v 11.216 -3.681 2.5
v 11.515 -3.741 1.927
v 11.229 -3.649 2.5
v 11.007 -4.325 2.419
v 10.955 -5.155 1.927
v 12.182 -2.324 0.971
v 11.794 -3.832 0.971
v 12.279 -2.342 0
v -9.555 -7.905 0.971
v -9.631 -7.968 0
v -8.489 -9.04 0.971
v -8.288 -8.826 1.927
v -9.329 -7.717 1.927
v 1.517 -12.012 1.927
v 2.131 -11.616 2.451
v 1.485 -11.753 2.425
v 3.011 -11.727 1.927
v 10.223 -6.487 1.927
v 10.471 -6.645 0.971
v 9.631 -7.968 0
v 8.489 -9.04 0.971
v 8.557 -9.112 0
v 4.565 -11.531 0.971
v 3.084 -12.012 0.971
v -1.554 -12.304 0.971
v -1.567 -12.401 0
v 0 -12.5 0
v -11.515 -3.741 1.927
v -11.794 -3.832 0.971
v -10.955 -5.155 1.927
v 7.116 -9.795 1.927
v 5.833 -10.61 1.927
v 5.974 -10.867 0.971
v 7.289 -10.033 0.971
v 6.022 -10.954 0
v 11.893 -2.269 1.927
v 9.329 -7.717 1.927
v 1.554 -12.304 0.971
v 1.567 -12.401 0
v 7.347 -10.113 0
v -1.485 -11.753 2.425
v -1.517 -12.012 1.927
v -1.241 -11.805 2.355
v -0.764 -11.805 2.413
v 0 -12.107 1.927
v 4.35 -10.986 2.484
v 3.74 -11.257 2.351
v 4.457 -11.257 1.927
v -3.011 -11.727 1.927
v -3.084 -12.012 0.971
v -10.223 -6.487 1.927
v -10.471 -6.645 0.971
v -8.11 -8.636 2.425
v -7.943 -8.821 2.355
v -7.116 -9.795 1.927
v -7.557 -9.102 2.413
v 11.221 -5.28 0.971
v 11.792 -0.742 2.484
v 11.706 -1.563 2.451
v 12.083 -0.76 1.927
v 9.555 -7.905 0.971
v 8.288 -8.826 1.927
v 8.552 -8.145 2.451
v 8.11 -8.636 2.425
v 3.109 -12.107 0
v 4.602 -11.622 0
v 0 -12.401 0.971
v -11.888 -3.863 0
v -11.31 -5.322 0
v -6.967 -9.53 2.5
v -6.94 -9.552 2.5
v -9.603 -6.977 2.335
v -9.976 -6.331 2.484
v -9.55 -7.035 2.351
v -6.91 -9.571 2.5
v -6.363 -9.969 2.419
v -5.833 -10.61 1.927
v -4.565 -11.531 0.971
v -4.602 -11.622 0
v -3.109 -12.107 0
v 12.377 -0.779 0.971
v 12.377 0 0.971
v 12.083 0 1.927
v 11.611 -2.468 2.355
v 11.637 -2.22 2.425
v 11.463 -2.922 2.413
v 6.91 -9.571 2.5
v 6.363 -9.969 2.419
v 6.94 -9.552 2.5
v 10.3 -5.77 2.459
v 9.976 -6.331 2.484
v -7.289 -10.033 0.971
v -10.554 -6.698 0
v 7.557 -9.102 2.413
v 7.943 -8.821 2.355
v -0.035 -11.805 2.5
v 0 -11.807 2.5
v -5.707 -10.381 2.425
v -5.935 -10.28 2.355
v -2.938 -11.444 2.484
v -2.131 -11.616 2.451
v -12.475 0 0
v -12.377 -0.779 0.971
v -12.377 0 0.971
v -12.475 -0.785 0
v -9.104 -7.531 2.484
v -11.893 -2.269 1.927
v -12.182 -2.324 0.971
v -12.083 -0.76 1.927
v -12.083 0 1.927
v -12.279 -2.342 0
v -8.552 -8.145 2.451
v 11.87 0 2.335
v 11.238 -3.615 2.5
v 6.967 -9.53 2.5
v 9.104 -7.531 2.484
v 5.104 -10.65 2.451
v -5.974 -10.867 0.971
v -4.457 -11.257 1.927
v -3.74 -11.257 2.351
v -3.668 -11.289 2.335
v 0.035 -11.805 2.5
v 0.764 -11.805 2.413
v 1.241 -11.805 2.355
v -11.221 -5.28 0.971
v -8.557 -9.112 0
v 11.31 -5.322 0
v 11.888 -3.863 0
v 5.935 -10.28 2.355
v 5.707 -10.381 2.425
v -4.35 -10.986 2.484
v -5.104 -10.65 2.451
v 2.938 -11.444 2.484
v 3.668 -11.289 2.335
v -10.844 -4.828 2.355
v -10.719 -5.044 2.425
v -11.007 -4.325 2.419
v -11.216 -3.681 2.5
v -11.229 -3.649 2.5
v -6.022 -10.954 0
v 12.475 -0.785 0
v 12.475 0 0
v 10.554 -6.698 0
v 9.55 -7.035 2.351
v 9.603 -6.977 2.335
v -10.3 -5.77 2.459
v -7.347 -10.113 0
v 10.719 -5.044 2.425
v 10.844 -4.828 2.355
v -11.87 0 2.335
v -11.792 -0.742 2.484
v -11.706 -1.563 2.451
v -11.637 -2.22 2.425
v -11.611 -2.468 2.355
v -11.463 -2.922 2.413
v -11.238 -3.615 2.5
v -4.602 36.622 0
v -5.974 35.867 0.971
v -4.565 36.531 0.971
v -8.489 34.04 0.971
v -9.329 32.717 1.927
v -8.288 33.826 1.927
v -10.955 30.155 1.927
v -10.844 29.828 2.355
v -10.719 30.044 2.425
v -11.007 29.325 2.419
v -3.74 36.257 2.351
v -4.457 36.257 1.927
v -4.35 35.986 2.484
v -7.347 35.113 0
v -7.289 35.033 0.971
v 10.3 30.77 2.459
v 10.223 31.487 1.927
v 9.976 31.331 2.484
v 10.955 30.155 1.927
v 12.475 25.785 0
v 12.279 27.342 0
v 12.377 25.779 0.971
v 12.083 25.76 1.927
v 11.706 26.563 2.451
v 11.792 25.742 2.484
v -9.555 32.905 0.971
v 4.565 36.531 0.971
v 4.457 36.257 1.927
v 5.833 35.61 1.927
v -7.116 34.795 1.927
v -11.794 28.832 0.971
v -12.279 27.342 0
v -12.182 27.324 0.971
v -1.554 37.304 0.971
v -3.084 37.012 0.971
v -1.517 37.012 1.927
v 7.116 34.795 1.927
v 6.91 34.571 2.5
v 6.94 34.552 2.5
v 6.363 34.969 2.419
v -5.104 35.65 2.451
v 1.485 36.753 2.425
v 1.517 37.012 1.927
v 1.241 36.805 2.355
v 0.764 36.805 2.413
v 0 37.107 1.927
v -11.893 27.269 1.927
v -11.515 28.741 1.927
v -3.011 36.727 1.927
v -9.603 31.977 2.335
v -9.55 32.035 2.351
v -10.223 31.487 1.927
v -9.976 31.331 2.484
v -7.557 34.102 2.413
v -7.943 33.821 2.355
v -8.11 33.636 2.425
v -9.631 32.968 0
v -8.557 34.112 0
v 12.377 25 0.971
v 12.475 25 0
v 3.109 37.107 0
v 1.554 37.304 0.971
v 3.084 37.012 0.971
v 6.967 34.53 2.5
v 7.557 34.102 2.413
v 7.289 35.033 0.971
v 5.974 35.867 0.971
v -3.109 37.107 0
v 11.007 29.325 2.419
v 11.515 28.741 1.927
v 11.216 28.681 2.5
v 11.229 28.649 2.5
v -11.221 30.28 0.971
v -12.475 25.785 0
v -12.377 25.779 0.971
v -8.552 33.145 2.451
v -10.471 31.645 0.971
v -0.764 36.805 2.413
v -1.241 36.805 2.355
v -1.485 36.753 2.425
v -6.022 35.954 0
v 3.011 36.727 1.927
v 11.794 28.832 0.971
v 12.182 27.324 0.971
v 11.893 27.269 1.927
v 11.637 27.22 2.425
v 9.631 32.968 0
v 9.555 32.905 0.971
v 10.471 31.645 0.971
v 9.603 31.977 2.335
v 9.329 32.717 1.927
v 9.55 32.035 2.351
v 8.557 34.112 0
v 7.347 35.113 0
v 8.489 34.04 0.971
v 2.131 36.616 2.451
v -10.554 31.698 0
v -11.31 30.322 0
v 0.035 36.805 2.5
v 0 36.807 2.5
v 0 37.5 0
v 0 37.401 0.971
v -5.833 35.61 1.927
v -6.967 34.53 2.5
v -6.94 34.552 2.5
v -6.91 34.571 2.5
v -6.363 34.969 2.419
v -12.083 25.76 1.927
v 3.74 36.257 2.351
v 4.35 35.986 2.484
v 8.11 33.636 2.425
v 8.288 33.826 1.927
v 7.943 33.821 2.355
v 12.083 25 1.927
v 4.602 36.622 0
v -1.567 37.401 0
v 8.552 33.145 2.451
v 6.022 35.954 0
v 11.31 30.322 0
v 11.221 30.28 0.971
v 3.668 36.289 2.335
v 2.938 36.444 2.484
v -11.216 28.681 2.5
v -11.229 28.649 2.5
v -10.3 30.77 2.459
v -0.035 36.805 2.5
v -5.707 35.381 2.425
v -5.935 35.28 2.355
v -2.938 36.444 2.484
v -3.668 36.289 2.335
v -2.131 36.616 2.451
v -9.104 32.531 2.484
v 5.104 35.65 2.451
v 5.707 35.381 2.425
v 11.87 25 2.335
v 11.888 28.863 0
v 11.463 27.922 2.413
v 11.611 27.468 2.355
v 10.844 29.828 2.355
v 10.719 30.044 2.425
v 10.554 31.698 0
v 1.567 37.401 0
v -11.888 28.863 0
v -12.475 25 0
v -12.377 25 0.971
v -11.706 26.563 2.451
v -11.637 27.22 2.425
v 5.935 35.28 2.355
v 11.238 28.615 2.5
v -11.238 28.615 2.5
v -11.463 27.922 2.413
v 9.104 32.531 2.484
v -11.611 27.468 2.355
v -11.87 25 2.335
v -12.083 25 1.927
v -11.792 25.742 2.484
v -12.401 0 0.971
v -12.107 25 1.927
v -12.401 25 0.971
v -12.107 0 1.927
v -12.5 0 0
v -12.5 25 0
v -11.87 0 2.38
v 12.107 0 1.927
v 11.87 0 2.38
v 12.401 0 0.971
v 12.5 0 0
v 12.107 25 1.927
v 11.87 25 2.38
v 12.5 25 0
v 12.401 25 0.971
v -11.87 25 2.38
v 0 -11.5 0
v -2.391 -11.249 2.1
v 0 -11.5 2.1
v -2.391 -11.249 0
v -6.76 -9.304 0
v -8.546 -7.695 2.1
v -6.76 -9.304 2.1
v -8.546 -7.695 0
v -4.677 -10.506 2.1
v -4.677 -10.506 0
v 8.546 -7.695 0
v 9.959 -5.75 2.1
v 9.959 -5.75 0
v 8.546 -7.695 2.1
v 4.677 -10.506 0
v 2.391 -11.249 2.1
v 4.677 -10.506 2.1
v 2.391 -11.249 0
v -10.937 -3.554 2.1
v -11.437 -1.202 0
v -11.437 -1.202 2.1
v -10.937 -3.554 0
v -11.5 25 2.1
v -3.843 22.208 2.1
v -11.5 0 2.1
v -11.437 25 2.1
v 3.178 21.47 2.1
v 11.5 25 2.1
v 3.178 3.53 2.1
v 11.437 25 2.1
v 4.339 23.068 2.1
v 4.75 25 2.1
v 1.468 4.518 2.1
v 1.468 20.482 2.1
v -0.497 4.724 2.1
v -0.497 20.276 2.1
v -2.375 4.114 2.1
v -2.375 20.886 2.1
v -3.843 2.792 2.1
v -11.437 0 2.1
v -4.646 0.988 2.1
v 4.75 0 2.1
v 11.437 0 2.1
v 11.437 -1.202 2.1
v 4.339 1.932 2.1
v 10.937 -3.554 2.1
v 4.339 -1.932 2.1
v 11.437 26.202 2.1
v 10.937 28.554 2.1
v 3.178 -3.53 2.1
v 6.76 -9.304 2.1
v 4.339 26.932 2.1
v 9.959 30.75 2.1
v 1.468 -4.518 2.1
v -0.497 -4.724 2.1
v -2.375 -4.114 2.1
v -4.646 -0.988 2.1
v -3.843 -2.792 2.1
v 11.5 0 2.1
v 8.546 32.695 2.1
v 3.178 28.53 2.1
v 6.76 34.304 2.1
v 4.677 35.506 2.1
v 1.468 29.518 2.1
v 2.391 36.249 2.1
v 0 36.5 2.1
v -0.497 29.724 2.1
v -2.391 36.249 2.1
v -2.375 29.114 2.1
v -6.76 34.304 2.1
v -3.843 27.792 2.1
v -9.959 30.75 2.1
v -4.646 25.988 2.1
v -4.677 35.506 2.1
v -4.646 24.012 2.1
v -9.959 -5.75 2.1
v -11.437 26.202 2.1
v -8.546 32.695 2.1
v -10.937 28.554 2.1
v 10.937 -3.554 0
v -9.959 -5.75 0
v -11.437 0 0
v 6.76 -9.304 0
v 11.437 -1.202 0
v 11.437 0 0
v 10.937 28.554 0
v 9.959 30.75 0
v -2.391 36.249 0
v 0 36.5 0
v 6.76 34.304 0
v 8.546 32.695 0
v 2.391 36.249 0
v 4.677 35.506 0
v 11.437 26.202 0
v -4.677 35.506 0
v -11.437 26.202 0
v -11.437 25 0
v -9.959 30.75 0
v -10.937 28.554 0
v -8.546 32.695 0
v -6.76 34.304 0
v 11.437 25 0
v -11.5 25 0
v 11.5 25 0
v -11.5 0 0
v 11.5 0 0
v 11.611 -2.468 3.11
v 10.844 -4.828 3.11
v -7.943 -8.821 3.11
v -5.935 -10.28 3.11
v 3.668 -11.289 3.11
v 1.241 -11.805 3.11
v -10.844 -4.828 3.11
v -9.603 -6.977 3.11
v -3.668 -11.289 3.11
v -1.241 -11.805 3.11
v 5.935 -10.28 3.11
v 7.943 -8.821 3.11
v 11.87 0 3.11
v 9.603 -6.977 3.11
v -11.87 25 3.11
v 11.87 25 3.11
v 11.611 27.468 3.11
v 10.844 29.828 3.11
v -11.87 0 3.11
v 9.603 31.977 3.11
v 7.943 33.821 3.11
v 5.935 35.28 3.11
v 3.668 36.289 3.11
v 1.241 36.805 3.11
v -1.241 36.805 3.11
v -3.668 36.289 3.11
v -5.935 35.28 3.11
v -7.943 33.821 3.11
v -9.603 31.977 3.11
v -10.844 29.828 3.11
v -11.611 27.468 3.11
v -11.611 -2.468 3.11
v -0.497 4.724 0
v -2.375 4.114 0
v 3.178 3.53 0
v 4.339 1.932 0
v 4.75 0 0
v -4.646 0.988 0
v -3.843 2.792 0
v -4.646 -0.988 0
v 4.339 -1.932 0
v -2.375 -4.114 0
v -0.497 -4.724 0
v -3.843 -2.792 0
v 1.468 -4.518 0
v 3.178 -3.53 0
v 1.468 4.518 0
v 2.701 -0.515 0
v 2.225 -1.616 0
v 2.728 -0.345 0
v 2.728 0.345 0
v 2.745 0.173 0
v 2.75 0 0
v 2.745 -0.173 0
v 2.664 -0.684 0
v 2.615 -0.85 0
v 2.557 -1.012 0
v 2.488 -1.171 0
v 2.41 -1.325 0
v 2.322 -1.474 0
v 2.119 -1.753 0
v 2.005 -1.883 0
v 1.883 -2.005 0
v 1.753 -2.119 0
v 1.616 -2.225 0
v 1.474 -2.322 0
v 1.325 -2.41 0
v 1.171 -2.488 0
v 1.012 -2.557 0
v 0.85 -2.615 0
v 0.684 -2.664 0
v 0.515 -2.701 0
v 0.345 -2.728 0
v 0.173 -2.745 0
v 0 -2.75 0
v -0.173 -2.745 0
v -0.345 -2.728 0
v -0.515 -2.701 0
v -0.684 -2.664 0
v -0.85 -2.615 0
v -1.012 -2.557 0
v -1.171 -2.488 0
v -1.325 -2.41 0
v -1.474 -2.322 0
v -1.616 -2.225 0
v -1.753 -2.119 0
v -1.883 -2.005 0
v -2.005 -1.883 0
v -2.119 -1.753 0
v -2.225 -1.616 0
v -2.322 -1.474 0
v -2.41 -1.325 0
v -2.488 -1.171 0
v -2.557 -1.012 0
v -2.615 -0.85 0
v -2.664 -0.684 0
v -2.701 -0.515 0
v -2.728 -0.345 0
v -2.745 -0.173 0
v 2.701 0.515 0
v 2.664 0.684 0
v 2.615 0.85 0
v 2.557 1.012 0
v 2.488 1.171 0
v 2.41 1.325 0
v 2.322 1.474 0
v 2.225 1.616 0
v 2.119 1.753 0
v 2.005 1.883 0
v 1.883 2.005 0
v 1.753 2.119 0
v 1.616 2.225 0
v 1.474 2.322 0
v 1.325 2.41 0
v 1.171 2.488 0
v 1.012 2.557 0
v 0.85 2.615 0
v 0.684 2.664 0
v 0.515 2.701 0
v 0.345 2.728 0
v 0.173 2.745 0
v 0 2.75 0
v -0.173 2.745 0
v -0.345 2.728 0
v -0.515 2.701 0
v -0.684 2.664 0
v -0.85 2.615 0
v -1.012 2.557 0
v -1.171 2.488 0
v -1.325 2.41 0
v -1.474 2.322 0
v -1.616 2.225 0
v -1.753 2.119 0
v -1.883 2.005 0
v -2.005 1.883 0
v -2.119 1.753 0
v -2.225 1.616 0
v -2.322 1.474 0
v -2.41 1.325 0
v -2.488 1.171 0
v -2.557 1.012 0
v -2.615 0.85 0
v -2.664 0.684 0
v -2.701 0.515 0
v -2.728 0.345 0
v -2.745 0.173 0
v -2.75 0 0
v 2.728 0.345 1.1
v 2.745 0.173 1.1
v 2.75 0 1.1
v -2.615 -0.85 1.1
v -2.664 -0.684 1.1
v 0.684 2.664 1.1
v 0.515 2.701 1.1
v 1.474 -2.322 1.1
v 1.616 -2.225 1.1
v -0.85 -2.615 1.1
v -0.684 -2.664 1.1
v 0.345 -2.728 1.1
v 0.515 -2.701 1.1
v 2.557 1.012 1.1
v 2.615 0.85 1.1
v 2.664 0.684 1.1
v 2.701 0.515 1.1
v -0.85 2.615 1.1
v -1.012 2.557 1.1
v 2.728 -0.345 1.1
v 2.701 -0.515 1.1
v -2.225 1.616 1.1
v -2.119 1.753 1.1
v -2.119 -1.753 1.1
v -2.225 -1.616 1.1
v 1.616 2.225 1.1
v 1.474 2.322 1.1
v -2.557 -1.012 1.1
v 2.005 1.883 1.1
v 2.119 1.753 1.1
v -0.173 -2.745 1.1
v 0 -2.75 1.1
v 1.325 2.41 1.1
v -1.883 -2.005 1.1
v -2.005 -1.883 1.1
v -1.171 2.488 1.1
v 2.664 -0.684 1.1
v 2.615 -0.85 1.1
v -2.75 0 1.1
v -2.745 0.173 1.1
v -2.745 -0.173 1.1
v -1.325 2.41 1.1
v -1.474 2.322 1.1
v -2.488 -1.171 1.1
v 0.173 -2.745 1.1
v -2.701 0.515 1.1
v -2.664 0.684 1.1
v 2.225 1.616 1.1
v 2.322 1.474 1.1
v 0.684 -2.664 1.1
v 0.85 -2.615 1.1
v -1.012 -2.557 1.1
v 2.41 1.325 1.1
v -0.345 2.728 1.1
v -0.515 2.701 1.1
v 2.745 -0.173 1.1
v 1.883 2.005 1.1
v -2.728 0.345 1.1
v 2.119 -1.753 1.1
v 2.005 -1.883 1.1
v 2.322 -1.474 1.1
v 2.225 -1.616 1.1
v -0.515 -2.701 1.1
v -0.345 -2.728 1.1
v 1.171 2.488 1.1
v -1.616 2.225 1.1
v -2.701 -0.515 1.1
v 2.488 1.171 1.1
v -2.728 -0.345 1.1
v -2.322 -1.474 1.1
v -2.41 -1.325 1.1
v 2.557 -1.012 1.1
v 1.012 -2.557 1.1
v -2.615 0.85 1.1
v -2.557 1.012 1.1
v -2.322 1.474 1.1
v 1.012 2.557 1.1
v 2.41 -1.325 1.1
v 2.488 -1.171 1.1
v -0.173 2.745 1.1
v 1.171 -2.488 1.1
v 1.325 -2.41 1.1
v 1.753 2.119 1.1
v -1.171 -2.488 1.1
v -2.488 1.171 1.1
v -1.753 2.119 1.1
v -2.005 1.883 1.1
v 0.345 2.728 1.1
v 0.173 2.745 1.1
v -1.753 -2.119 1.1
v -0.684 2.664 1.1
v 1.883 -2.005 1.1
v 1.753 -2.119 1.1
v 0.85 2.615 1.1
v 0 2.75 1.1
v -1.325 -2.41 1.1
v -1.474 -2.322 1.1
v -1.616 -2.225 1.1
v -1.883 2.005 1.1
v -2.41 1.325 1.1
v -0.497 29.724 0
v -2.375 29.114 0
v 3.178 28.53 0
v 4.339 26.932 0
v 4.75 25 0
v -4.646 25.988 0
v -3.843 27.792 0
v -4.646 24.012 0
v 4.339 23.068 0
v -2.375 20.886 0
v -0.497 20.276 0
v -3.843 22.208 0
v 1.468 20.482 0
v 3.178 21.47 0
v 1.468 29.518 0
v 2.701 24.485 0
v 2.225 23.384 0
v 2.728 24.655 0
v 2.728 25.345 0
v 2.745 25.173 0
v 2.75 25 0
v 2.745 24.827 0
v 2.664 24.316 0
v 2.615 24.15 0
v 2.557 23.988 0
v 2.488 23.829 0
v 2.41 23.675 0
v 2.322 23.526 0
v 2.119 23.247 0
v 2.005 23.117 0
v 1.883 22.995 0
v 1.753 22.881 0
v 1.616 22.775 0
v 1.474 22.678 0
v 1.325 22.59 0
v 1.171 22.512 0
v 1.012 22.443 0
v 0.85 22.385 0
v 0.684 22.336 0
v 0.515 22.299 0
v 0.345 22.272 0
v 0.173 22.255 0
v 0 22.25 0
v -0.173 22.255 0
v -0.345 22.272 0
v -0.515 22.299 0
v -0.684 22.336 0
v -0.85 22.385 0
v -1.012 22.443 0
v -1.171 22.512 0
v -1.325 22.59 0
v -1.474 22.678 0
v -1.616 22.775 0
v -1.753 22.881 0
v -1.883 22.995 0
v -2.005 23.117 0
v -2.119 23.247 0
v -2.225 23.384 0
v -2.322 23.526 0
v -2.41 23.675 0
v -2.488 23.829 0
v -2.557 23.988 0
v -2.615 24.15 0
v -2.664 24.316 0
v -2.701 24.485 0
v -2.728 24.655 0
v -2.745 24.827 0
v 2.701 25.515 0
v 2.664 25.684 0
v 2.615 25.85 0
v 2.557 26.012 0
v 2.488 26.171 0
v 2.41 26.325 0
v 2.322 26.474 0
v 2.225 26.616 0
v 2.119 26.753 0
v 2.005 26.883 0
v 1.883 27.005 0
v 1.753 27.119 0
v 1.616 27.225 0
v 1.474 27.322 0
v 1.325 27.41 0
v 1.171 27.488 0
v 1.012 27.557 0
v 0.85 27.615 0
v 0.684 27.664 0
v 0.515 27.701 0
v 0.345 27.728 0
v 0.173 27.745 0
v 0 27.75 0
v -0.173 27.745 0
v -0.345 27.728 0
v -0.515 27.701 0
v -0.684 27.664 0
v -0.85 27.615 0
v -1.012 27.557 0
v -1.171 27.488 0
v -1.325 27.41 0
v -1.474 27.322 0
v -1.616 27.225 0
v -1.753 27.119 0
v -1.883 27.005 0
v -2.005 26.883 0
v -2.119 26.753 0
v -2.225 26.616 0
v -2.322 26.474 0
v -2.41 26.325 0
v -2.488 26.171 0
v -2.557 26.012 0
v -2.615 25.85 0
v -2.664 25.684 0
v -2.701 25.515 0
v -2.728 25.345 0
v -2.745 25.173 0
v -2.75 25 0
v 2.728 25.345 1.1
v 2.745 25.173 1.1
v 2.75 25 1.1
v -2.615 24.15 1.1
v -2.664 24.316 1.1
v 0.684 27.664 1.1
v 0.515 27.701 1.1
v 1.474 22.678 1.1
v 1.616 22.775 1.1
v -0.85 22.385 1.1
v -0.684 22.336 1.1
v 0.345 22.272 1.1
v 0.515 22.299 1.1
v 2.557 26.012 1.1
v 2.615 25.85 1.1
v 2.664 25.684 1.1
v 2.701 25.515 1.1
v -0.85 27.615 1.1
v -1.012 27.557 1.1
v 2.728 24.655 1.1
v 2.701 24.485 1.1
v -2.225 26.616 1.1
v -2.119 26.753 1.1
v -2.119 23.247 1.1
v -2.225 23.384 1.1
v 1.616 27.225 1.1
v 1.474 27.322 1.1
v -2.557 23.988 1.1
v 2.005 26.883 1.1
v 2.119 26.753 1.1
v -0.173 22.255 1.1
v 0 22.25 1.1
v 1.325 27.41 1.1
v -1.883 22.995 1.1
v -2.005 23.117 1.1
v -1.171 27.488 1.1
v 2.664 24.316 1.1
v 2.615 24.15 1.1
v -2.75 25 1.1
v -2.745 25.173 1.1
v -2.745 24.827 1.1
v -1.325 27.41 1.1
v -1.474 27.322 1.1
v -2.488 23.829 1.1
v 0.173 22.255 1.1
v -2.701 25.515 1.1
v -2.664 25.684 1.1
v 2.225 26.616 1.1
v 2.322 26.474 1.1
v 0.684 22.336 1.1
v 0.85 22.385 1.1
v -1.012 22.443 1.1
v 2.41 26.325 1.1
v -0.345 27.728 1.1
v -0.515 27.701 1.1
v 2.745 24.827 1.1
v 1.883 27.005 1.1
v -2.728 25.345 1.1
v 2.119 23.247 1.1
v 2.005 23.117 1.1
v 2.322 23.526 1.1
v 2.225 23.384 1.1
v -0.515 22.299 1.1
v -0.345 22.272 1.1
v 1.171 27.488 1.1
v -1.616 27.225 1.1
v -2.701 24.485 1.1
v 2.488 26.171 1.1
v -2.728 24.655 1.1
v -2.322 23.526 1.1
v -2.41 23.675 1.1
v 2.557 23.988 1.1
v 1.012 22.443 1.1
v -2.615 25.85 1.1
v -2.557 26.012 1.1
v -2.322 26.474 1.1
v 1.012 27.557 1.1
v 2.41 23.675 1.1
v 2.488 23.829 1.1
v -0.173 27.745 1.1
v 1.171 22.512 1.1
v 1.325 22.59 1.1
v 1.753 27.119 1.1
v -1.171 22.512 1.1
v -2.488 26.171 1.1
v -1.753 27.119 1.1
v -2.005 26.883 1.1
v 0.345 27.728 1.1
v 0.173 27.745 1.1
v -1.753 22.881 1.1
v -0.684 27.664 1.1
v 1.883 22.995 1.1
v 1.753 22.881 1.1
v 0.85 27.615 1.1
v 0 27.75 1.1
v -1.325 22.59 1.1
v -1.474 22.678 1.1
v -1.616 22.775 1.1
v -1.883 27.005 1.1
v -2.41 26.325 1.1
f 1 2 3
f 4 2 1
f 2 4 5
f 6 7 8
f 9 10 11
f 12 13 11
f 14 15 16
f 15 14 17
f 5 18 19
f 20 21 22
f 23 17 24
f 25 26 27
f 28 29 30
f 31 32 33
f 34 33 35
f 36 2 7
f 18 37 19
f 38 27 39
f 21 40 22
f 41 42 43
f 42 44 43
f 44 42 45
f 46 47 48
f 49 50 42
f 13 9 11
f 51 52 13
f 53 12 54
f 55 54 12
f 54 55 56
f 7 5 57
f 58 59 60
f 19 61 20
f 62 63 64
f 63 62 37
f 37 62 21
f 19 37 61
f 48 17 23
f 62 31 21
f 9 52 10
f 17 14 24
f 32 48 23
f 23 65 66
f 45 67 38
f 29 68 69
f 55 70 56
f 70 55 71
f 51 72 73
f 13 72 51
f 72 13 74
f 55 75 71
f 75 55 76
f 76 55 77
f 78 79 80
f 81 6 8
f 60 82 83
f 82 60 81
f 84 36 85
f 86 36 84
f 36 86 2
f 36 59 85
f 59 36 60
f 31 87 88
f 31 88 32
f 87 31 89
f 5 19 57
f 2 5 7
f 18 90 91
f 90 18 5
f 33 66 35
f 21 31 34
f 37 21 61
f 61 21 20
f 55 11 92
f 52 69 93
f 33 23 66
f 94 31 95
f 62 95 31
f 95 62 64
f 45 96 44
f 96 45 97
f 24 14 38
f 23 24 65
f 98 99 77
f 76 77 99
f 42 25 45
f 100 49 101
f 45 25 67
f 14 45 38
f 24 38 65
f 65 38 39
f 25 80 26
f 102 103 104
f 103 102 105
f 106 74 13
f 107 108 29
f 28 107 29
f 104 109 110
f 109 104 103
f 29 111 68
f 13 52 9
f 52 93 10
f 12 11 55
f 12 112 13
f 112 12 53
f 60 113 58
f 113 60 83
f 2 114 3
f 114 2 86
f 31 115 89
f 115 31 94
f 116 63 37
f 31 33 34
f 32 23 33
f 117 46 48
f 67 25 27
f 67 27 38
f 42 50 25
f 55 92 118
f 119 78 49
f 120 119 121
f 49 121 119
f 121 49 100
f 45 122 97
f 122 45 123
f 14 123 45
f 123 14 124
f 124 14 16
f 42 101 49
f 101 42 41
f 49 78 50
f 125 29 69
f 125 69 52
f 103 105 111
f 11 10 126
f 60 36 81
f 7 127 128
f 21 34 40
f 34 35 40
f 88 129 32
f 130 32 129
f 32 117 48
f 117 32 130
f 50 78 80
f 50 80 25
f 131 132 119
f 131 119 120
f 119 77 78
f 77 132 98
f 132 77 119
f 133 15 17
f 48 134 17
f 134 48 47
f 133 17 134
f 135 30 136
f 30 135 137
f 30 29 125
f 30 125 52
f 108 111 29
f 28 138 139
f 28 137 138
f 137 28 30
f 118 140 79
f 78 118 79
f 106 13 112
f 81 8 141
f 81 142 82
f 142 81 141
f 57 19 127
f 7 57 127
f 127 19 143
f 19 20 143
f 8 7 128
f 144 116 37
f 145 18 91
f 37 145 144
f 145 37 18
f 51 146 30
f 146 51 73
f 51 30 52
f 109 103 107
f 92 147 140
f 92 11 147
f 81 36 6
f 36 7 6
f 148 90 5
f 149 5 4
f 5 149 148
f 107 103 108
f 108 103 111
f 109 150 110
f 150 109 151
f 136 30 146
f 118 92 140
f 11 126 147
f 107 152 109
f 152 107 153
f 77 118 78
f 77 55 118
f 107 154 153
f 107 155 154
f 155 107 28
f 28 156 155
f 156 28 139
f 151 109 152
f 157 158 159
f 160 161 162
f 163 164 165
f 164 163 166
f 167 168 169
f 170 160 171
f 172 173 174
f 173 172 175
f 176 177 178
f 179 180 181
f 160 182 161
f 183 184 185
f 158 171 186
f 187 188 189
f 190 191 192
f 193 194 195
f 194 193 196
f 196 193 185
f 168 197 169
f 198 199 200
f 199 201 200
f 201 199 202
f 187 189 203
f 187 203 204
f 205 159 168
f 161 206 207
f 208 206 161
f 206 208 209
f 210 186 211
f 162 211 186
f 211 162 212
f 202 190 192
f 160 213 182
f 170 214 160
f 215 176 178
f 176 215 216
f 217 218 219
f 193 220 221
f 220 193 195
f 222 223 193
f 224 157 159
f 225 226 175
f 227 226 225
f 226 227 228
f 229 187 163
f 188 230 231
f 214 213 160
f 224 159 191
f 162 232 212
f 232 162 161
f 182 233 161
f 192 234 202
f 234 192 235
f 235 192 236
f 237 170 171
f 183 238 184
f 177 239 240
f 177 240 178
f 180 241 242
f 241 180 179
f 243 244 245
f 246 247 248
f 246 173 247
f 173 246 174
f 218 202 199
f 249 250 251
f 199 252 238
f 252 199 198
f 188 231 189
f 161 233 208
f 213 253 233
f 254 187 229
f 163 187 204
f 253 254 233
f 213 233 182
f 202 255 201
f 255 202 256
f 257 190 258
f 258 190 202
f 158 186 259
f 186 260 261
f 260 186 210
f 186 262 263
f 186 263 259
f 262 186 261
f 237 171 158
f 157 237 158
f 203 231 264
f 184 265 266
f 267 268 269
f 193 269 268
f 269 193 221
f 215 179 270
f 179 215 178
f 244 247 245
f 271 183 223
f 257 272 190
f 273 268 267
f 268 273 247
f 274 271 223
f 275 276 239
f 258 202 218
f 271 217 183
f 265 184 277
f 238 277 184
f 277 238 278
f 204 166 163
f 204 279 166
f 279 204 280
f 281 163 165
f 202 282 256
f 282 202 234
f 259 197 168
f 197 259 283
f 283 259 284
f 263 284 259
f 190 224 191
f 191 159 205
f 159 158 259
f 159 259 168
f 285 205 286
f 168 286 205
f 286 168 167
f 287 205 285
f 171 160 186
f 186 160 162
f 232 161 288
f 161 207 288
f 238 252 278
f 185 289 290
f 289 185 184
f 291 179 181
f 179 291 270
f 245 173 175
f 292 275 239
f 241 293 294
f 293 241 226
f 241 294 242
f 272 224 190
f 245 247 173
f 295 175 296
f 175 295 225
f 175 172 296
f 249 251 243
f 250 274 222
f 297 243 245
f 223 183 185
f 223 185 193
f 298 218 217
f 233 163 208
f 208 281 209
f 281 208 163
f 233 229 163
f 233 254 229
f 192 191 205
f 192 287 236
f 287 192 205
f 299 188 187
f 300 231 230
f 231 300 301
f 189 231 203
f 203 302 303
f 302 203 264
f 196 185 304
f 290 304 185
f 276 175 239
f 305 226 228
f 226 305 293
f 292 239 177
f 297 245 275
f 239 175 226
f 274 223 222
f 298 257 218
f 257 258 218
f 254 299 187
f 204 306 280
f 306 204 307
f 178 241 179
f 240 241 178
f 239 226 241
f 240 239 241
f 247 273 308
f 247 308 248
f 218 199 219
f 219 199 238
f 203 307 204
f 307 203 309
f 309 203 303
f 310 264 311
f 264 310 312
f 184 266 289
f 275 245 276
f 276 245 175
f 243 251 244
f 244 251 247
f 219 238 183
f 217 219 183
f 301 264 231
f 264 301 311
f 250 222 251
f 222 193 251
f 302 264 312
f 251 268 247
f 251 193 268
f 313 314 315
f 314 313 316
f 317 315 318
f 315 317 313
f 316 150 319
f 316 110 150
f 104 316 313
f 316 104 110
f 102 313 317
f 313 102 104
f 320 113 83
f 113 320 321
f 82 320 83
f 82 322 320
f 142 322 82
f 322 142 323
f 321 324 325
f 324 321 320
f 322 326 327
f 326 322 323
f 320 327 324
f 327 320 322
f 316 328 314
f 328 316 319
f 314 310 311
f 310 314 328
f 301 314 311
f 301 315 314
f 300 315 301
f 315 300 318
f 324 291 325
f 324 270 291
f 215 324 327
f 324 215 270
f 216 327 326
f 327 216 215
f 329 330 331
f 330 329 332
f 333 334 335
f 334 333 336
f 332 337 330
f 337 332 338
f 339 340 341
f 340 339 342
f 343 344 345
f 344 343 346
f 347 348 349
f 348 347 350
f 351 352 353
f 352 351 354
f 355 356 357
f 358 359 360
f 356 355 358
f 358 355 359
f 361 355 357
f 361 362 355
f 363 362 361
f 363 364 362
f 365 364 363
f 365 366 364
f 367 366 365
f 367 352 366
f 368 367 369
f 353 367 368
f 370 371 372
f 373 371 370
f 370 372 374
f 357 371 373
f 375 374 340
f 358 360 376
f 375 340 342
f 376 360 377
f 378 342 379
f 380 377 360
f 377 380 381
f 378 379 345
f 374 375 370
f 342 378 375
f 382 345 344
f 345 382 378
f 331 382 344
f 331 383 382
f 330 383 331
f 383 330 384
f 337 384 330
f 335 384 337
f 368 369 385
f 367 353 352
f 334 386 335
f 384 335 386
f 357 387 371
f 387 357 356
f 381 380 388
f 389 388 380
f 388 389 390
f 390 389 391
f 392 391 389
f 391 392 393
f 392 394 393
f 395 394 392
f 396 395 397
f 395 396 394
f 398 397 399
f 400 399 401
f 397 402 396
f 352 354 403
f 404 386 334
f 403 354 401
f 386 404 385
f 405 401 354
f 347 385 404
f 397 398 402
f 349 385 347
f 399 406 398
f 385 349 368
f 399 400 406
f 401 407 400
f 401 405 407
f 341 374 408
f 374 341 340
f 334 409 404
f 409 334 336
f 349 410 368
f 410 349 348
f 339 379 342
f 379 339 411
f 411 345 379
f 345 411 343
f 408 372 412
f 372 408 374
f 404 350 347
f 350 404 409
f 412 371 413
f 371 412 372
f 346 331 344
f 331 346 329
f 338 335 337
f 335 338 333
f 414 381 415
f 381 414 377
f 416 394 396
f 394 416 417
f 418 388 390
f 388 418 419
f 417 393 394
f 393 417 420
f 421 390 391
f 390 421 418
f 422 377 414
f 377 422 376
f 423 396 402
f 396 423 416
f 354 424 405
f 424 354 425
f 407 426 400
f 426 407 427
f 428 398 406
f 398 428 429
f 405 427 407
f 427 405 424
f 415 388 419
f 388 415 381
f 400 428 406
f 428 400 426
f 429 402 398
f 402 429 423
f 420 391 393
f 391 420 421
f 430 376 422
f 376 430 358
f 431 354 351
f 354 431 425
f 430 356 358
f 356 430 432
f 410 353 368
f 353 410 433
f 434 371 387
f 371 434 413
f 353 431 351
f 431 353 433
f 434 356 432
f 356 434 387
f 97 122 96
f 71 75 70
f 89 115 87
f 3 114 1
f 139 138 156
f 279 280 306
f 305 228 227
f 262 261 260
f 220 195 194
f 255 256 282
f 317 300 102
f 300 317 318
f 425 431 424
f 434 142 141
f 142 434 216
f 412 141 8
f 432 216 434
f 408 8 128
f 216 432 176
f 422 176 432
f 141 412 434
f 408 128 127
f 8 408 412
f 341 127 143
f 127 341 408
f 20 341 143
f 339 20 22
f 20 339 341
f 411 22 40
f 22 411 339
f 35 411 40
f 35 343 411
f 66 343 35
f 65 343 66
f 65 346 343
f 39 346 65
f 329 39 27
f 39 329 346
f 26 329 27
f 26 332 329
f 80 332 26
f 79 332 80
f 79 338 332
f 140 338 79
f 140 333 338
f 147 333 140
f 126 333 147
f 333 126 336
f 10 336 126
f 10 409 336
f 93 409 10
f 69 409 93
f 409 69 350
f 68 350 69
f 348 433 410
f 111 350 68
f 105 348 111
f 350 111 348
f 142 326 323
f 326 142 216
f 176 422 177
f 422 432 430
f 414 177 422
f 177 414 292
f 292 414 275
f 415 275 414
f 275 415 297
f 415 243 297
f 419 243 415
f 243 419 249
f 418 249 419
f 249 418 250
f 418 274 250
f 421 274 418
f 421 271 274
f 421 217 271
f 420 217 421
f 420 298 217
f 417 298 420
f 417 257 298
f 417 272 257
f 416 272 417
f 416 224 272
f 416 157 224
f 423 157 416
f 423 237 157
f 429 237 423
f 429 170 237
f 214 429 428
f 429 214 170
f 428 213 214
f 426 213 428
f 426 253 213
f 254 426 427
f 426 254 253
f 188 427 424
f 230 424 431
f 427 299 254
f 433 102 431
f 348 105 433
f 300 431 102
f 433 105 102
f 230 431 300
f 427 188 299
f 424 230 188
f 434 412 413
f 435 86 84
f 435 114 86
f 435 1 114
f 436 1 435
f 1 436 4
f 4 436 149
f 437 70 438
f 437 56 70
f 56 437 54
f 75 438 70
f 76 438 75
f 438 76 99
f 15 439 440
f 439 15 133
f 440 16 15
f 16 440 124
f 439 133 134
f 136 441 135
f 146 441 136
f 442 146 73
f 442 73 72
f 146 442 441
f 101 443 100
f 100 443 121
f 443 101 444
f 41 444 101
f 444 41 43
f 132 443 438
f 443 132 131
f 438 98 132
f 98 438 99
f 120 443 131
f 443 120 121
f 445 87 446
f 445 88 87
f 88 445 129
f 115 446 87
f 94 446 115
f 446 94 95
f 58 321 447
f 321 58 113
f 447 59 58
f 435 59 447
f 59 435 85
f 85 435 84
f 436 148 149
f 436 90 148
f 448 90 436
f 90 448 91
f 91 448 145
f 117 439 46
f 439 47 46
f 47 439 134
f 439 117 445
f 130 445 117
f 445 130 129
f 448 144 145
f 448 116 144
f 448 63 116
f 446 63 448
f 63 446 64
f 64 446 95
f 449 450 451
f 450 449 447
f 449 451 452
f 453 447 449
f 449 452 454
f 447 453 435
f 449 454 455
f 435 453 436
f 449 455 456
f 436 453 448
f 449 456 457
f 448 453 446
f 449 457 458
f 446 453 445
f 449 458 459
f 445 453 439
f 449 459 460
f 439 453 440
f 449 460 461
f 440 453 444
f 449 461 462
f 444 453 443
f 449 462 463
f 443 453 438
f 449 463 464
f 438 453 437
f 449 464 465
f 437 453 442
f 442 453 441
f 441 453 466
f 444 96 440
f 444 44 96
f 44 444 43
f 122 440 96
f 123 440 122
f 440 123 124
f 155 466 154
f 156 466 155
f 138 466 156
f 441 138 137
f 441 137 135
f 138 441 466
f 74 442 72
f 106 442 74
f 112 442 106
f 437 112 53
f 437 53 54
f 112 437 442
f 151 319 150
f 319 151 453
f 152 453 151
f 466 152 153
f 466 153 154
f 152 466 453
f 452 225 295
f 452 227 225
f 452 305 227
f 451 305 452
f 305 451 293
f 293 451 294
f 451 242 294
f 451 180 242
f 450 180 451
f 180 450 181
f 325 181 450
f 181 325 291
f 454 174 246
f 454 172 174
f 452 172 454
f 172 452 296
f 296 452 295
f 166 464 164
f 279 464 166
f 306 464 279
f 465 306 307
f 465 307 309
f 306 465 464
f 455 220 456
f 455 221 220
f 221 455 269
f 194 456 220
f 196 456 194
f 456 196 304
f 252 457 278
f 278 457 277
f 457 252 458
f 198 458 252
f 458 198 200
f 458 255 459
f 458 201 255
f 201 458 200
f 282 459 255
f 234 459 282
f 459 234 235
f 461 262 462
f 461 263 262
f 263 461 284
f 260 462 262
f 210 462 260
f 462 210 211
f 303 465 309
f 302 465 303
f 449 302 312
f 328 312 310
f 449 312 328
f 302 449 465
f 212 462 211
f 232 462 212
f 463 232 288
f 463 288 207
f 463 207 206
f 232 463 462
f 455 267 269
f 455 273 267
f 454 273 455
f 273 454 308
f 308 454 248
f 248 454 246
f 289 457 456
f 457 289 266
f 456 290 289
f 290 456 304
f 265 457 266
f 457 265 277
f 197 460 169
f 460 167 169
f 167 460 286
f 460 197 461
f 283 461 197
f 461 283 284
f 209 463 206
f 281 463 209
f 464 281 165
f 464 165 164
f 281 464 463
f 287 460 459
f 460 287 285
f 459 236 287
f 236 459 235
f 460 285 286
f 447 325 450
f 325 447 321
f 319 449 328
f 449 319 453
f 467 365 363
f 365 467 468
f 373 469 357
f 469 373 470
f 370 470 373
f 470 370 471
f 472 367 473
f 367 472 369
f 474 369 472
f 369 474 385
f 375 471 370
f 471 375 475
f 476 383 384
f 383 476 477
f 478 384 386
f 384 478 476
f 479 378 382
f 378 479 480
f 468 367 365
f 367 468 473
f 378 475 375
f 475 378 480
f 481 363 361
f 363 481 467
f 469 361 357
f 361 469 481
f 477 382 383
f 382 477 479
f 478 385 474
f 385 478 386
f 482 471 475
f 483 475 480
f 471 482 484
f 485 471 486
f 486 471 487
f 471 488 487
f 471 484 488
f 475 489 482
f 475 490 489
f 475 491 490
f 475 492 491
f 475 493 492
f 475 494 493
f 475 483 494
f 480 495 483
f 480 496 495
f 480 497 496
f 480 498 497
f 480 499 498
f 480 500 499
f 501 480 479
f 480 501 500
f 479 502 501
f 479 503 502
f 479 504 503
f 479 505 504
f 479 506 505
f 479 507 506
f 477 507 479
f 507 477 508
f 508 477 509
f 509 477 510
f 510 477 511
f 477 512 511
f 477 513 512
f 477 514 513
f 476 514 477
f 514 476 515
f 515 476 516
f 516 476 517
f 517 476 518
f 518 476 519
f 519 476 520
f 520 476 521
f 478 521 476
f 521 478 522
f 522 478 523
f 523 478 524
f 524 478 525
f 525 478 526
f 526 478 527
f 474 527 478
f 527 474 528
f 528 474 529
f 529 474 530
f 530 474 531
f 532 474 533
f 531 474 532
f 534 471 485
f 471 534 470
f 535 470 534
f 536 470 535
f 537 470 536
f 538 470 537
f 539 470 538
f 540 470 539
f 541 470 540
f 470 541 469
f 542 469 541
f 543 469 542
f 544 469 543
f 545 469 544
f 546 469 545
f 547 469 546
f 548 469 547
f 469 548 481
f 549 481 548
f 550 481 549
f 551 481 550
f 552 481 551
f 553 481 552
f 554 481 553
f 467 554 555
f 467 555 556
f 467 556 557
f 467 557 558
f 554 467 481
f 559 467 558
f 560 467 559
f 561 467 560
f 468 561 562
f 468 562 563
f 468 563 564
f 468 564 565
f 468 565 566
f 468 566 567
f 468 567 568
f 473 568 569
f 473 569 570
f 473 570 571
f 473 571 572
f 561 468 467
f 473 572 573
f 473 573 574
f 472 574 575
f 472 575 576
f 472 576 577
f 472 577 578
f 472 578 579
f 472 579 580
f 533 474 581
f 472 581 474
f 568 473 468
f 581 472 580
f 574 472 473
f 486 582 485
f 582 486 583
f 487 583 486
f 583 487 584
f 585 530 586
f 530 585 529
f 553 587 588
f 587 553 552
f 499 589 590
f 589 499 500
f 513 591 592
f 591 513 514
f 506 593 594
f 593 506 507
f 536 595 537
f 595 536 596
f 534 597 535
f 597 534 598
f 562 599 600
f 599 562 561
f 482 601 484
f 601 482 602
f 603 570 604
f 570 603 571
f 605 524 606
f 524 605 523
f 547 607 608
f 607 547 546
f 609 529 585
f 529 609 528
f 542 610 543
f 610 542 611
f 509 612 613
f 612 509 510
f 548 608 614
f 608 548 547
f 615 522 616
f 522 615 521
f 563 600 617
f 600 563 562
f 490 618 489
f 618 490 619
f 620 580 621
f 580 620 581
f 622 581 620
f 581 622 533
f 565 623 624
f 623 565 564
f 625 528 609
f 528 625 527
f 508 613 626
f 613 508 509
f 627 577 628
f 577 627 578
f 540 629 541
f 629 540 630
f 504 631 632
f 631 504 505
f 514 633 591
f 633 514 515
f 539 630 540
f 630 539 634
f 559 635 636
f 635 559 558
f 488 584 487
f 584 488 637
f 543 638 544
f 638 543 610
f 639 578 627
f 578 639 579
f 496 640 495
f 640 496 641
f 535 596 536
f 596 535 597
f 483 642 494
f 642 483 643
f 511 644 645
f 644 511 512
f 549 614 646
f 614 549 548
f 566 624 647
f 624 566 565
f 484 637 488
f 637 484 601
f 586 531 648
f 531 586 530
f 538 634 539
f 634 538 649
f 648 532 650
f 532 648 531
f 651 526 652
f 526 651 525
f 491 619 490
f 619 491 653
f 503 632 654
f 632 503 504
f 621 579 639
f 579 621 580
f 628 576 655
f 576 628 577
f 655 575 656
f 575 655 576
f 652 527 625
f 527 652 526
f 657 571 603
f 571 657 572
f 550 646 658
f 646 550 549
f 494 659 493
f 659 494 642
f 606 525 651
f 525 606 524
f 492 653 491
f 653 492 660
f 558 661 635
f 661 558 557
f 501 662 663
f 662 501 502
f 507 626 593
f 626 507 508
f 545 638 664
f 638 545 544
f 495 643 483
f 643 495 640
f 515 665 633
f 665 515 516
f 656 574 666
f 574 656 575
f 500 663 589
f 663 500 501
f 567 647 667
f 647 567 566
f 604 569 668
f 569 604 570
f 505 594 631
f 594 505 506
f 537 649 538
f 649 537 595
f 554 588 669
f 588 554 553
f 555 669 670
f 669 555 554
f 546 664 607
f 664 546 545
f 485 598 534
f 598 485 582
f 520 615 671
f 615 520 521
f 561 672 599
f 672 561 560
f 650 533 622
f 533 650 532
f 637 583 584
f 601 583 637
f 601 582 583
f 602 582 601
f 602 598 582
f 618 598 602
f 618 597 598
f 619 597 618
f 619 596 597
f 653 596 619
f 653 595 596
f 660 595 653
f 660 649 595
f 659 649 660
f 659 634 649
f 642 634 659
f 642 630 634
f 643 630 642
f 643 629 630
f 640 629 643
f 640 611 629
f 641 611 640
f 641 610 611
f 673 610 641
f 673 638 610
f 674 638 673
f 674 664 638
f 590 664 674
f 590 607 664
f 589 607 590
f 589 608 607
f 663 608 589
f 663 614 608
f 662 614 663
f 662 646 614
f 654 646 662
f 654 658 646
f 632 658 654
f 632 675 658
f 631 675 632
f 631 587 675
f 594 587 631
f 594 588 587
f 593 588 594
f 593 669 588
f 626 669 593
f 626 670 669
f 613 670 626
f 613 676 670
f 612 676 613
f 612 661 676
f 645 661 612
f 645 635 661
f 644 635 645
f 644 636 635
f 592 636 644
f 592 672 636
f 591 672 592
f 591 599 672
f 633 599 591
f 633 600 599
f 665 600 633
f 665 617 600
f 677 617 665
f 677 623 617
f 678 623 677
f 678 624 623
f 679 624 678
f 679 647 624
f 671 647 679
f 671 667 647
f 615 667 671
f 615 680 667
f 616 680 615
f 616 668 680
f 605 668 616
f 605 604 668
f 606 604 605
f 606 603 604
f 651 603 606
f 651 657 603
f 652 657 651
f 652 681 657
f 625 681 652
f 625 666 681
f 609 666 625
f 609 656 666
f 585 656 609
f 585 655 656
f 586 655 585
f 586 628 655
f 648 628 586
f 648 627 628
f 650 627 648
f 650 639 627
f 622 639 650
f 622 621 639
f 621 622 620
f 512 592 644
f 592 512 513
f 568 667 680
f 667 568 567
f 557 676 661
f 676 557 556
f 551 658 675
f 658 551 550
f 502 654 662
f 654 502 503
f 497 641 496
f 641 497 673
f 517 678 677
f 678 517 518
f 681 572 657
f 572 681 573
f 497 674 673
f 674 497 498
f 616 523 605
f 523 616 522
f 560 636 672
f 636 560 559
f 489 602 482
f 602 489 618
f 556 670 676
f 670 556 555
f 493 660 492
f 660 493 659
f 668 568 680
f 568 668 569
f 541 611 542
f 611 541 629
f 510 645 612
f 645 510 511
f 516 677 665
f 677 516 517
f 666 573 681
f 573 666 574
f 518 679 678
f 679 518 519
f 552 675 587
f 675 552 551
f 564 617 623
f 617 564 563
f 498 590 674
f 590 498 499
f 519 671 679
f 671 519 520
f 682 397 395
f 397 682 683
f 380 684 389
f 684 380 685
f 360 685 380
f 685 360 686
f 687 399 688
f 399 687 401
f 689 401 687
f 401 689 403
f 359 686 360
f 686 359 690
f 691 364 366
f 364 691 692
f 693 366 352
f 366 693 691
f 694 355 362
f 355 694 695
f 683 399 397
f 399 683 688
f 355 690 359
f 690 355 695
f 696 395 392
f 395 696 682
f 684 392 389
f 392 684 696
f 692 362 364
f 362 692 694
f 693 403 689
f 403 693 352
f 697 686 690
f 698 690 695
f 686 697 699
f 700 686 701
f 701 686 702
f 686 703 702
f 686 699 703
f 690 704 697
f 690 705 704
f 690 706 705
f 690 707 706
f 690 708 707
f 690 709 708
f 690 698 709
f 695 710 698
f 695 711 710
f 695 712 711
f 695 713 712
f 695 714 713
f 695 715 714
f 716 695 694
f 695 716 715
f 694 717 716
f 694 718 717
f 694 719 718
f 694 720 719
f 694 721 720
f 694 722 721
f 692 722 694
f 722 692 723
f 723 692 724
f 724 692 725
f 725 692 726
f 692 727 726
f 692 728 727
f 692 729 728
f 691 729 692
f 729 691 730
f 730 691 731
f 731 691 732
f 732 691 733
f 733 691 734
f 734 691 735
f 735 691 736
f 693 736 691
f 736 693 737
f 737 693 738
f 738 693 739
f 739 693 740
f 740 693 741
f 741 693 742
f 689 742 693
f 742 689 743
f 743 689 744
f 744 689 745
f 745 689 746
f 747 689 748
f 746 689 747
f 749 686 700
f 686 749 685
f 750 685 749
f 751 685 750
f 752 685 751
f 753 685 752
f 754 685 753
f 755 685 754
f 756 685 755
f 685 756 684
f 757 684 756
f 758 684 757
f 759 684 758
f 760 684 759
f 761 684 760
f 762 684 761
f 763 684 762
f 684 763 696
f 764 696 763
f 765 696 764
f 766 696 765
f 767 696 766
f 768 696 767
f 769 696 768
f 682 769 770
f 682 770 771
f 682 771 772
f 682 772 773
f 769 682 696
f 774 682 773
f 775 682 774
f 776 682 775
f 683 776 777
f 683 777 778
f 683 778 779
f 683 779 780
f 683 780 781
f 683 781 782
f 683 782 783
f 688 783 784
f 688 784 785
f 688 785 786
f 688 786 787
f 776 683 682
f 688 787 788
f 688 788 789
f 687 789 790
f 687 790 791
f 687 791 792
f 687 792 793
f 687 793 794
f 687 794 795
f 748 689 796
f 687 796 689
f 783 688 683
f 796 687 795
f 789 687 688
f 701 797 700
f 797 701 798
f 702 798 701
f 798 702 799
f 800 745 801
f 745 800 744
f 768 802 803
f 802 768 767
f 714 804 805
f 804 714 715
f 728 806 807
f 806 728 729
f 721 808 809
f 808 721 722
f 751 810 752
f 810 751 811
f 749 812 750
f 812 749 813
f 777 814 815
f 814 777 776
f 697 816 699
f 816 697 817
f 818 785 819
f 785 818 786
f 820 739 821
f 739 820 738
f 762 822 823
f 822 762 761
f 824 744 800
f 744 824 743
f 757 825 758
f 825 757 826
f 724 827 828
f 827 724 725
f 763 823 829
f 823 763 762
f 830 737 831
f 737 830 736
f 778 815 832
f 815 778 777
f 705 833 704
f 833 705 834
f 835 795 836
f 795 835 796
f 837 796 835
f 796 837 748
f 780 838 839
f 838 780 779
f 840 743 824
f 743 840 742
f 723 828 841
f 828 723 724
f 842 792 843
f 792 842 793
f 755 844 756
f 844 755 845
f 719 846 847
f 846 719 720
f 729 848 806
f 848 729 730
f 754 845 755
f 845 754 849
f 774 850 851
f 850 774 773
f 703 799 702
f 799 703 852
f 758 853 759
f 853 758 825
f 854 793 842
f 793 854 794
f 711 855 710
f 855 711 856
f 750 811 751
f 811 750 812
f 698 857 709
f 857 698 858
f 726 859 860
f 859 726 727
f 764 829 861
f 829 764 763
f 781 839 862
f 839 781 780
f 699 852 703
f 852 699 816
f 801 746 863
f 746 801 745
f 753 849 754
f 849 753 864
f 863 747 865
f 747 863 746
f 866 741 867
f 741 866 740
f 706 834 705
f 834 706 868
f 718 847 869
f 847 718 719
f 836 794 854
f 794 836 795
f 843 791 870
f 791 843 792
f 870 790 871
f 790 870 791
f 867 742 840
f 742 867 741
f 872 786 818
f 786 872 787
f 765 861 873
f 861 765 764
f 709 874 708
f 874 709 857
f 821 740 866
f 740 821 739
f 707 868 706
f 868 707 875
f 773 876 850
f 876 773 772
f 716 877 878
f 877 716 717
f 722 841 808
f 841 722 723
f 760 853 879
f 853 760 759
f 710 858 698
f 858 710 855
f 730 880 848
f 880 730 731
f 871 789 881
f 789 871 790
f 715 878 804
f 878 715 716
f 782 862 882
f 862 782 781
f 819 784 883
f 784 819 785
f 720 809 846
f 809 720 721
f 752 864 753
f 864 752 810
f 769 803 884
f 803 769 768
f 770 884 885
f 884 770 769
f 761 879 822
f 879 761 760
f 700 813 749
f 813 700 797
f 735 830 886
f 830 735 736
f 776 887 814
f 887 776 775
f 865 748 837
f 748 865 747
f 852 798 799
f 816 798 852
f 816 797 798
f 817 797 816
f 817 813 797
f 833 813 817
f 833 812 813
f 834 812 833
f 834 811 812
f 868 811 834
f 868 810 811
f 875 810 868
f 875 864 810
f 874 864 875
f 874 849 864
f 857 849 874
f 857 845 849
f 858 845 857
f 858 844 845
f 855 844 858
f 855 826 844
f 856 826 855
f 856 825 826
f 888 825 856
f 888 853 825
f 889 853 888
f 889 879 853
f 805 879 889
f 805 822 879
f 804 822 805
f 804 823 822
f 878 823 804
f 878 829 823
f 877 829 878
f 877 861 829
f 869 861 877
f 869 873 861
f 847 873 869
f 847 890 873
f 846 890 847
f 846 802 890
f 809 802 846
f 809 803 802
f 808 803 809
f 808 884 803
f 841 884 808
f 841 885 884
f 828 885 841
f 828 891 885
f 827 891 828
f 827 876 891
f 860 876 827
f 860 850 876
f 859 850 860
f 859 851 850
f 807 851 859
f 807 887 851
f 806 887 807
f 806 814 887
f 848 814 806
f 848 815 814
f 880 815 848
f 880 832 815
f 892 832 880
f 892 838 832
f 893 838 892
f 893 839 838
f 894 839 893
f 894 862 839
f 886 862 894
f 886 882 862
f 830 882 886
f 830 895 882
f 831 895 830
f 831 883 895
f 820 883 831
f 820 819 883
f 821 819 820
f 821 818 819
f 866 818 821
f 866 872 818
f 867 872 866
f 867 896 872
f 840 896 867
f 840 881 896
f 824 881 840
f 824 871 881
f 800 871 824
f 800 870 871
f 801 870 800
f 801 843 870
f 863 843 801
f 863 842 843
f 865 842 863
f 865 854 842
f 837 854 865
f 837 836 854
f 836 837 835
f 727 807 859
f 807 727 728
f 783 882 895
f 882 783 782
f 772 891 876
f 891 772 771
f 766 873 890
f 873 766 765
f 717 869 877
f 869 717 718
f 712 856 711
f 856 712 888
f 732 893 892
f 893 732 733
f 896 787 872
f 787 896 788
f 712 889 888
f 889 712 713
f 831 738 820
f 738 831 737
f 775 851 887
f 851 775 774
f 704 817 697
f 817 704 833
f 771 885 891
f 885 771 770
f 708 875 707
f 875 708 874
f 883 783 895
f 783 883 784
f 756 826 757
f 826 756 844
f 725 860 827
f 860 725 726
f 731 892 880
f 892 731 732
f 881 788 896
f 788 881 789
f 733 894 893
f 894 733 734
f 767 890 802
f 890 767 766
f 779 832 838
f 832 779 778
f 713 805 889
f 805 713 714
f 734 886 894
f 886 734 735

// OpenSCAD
// Rounded double bases, plain and textured
// (c) 2024, Juan Vera. Based on a previous design in Blender

/* Parameters */

// Diameter of the base (mm)
base_w = 25; // [10:100]
// Secondary diameter of the base (mm). Only used for the horse bases
base_texture=0; //  [0:Plain, 1:PlainHorses, 2:Bricks, 3:BricksHorses]
// Diameter of the magnet hole (mm). Add 0.5 for some tolerance
magnet_d = 5.5; // [2:0.5:10]
// Height of the hole (mm). Add 0.1 for some tolerance
magnet_h = 1.1; // [1:0.1:3.1]

/* [Bricks] */
// x size of the bricks (mm)
brick_x = 6.5; // [2:0.5:20]
// y size of the bricks (mm)
brick_y = 4.5; // [2:0.5:20]
// separation of the bricks, in x, relative to brick_x
brick_sep_x=1.01; // [1:0.01:1.5]
// separation of the bricks, in y, relative to brick_y
brick_sep_y=1.01; // [1:0.01:1.5]
// factor to sink the top of the brick
brick_f=0.99; // [0.95:0.01:1]
// offset of the bricks for odd lines lines (mm)
brick_offset=3.25; // [0:0.25:10]

/* [Hidden] */
// note: many dimensions are constant, because I want to match a base I modeled years ago in blender
// DO NOT CHANGE THESE VALUES. The final base will scale these values
// they are relative to a standard 25mm base
hole_r = 25/2-1; // dimensions of the hole. If hole_r==0, do not make a hole
hole_d = 2.1; // depth of the hole
base_total_height = 3.11; // The total height of the base
base_upper_r = 11.87; // The radius of the upper surface of a 25mm base
base_upper_h = 1; // The height of the upper surface of a 25mm base

use <circular_base.scad>;

module double_base_body(hole_r, hole_d) {
    rotate([0, 0, 90]) difference() {
        difference() {
            scale([1, 1, 0.62]) {
                sphere(r=25/2, $fn=50);
                translate([25, 0, 0]) sphere(r=25/2, $fn=50);
                rotate([90, 0, 90]) cylinder(r=25/2, h=25, $fn=50);
            }
            union() {
                translate([0, 0, 5+2.5]) cube([75, 30, 10], center=true);
                translate([0, 0, -5]) cube([75, 30, 10], center=true);
                if(hole_r > 0) {
                    cylinder(h=2*hole_d, r=hole_r, center=true);
                    translate([25, 0, 0]) cylinder(h=2*hole_d, r=hole_r, center=true);
                    translate([0, -hole_r, -hole_d]) cube([25, hole_r*2,2*hole_d]);
                }
            }
        }
    }
}
module base_plain_double(base_w, magnet_d, magnet_h) {
    scale([base_w/25, base_w/25, 1]) union() {
        double_base_body(hole_r, hole_d);
        translate([0, 0, 2.11]) cylinder(h=base_upper_h, r=base_upper_r);
        translate([0, 25, 2.11]) cylinder(h=base_upper_h, r=base_upper_r);
        //translate([base_upper_h, -base_w/2+(base_w/2-base_upper_r), 2.11]) {
        translate([-base_upper_r, 0, 2.11]) {
            cube([base_upper_r*2, 25, base_upper_h]);
        }
    }
    magnet_encase(magnet_d, magnet_h, magnet_d+4, 2.45);
    translate([0, base_w, 0]) magnet_encase(magnet_d, magnet_h, magnet_d+4, 2.45);
}

module bricks_surface_double(brick_x, brick_y, brick_o, base_w, sep_x=1.2, sep_y=1.2, brick_r=1) {
    intersection() {
        // brick_x, brick_y: size of the brick
        // brick_o: offset of each line of the brick
        // base_w: size of the base
        scale([base_w/25, base_w/25, 1]) union() {
            cylinder(h=10, r=base_upper_r);
            translate([0, 25, 0]) cylinder(h=10, r=base_upper_r);
            translate([-base_upper_r, 0, 0]) {
                cube([base_upper_r*2, 25, 10]);
            }
        }
        first_x = base_w / brick_x / 2 + 2;
        first_y = 2 * base_w / brick_y + 1;
        // small translation for stetics
        translate([0,0.2,0]) union() {
            for(i=[-first_x:first_x]) {
                for(j=[-first_y:first_y]) {
                    translate([i*sep_x*brick_x + (j%2)*brick_o, j*sep_y*brick_y, 0]) brick(brick_x, brick_y, base_upper_h, r=brick_r);
                }
            }
        }
    }
}
module base_bricks_double(base_w, magnet_d, magnet_h) {
    union() {
        scale([base_w/25, base_w/25, 1]) double_base_body(hole_r, hole_d);
        translate([0, 0, 2.11]) {
            bricks_surface_double(brick_x, brick_y, brick_offset, base_w, brick_sep_x, brick_sep_y);
        }
    }
    magnet_encase(magnet_d, magnet_h, magnet_d+4, 2.45);
    translate([0, base_w, 0]) magnet_encase(magnet_d, magnet_h, magnet_d+4, 2.45);
}

module base_pathway_double(base_w, magnet_d, magnet_h) {
    union() {
        scale([base_w/25, base_w/25, 1]) double_base_body(hole_r, hole_d);
        translate([0, 0, 2.11]) {
            bricks_surface_double(8, 8, 4, base_w, 0.9, 0.9);
        }
    }
    magnet_encase(magnet_d, magnet_h, magnet_d+4, 2.45);
    translate([0, base_w, 0]) magnet_encase(magnet_d, magnet_h, magnet_d+4, 2.45);
}

module base_double(base_texture, base_w, magnet_d, magnet_h) {
    if(base_texture == 0 || base_texture == 1) { // plain
        base_plain_double(base_w, magnet_d, magnet_h);
    }
    if(base_texture == 2 || base_texture == 3) { // bricks
        base_bricks_double(base_w, magnet_d, magnet_h);
    }
    if(base_texture == 6) { // pathway
        base_pathway_double(base_w, magnet_d, magnet_h);
    }
}

base_double(base_texture, base_w, magnet_d, magnet_h);
